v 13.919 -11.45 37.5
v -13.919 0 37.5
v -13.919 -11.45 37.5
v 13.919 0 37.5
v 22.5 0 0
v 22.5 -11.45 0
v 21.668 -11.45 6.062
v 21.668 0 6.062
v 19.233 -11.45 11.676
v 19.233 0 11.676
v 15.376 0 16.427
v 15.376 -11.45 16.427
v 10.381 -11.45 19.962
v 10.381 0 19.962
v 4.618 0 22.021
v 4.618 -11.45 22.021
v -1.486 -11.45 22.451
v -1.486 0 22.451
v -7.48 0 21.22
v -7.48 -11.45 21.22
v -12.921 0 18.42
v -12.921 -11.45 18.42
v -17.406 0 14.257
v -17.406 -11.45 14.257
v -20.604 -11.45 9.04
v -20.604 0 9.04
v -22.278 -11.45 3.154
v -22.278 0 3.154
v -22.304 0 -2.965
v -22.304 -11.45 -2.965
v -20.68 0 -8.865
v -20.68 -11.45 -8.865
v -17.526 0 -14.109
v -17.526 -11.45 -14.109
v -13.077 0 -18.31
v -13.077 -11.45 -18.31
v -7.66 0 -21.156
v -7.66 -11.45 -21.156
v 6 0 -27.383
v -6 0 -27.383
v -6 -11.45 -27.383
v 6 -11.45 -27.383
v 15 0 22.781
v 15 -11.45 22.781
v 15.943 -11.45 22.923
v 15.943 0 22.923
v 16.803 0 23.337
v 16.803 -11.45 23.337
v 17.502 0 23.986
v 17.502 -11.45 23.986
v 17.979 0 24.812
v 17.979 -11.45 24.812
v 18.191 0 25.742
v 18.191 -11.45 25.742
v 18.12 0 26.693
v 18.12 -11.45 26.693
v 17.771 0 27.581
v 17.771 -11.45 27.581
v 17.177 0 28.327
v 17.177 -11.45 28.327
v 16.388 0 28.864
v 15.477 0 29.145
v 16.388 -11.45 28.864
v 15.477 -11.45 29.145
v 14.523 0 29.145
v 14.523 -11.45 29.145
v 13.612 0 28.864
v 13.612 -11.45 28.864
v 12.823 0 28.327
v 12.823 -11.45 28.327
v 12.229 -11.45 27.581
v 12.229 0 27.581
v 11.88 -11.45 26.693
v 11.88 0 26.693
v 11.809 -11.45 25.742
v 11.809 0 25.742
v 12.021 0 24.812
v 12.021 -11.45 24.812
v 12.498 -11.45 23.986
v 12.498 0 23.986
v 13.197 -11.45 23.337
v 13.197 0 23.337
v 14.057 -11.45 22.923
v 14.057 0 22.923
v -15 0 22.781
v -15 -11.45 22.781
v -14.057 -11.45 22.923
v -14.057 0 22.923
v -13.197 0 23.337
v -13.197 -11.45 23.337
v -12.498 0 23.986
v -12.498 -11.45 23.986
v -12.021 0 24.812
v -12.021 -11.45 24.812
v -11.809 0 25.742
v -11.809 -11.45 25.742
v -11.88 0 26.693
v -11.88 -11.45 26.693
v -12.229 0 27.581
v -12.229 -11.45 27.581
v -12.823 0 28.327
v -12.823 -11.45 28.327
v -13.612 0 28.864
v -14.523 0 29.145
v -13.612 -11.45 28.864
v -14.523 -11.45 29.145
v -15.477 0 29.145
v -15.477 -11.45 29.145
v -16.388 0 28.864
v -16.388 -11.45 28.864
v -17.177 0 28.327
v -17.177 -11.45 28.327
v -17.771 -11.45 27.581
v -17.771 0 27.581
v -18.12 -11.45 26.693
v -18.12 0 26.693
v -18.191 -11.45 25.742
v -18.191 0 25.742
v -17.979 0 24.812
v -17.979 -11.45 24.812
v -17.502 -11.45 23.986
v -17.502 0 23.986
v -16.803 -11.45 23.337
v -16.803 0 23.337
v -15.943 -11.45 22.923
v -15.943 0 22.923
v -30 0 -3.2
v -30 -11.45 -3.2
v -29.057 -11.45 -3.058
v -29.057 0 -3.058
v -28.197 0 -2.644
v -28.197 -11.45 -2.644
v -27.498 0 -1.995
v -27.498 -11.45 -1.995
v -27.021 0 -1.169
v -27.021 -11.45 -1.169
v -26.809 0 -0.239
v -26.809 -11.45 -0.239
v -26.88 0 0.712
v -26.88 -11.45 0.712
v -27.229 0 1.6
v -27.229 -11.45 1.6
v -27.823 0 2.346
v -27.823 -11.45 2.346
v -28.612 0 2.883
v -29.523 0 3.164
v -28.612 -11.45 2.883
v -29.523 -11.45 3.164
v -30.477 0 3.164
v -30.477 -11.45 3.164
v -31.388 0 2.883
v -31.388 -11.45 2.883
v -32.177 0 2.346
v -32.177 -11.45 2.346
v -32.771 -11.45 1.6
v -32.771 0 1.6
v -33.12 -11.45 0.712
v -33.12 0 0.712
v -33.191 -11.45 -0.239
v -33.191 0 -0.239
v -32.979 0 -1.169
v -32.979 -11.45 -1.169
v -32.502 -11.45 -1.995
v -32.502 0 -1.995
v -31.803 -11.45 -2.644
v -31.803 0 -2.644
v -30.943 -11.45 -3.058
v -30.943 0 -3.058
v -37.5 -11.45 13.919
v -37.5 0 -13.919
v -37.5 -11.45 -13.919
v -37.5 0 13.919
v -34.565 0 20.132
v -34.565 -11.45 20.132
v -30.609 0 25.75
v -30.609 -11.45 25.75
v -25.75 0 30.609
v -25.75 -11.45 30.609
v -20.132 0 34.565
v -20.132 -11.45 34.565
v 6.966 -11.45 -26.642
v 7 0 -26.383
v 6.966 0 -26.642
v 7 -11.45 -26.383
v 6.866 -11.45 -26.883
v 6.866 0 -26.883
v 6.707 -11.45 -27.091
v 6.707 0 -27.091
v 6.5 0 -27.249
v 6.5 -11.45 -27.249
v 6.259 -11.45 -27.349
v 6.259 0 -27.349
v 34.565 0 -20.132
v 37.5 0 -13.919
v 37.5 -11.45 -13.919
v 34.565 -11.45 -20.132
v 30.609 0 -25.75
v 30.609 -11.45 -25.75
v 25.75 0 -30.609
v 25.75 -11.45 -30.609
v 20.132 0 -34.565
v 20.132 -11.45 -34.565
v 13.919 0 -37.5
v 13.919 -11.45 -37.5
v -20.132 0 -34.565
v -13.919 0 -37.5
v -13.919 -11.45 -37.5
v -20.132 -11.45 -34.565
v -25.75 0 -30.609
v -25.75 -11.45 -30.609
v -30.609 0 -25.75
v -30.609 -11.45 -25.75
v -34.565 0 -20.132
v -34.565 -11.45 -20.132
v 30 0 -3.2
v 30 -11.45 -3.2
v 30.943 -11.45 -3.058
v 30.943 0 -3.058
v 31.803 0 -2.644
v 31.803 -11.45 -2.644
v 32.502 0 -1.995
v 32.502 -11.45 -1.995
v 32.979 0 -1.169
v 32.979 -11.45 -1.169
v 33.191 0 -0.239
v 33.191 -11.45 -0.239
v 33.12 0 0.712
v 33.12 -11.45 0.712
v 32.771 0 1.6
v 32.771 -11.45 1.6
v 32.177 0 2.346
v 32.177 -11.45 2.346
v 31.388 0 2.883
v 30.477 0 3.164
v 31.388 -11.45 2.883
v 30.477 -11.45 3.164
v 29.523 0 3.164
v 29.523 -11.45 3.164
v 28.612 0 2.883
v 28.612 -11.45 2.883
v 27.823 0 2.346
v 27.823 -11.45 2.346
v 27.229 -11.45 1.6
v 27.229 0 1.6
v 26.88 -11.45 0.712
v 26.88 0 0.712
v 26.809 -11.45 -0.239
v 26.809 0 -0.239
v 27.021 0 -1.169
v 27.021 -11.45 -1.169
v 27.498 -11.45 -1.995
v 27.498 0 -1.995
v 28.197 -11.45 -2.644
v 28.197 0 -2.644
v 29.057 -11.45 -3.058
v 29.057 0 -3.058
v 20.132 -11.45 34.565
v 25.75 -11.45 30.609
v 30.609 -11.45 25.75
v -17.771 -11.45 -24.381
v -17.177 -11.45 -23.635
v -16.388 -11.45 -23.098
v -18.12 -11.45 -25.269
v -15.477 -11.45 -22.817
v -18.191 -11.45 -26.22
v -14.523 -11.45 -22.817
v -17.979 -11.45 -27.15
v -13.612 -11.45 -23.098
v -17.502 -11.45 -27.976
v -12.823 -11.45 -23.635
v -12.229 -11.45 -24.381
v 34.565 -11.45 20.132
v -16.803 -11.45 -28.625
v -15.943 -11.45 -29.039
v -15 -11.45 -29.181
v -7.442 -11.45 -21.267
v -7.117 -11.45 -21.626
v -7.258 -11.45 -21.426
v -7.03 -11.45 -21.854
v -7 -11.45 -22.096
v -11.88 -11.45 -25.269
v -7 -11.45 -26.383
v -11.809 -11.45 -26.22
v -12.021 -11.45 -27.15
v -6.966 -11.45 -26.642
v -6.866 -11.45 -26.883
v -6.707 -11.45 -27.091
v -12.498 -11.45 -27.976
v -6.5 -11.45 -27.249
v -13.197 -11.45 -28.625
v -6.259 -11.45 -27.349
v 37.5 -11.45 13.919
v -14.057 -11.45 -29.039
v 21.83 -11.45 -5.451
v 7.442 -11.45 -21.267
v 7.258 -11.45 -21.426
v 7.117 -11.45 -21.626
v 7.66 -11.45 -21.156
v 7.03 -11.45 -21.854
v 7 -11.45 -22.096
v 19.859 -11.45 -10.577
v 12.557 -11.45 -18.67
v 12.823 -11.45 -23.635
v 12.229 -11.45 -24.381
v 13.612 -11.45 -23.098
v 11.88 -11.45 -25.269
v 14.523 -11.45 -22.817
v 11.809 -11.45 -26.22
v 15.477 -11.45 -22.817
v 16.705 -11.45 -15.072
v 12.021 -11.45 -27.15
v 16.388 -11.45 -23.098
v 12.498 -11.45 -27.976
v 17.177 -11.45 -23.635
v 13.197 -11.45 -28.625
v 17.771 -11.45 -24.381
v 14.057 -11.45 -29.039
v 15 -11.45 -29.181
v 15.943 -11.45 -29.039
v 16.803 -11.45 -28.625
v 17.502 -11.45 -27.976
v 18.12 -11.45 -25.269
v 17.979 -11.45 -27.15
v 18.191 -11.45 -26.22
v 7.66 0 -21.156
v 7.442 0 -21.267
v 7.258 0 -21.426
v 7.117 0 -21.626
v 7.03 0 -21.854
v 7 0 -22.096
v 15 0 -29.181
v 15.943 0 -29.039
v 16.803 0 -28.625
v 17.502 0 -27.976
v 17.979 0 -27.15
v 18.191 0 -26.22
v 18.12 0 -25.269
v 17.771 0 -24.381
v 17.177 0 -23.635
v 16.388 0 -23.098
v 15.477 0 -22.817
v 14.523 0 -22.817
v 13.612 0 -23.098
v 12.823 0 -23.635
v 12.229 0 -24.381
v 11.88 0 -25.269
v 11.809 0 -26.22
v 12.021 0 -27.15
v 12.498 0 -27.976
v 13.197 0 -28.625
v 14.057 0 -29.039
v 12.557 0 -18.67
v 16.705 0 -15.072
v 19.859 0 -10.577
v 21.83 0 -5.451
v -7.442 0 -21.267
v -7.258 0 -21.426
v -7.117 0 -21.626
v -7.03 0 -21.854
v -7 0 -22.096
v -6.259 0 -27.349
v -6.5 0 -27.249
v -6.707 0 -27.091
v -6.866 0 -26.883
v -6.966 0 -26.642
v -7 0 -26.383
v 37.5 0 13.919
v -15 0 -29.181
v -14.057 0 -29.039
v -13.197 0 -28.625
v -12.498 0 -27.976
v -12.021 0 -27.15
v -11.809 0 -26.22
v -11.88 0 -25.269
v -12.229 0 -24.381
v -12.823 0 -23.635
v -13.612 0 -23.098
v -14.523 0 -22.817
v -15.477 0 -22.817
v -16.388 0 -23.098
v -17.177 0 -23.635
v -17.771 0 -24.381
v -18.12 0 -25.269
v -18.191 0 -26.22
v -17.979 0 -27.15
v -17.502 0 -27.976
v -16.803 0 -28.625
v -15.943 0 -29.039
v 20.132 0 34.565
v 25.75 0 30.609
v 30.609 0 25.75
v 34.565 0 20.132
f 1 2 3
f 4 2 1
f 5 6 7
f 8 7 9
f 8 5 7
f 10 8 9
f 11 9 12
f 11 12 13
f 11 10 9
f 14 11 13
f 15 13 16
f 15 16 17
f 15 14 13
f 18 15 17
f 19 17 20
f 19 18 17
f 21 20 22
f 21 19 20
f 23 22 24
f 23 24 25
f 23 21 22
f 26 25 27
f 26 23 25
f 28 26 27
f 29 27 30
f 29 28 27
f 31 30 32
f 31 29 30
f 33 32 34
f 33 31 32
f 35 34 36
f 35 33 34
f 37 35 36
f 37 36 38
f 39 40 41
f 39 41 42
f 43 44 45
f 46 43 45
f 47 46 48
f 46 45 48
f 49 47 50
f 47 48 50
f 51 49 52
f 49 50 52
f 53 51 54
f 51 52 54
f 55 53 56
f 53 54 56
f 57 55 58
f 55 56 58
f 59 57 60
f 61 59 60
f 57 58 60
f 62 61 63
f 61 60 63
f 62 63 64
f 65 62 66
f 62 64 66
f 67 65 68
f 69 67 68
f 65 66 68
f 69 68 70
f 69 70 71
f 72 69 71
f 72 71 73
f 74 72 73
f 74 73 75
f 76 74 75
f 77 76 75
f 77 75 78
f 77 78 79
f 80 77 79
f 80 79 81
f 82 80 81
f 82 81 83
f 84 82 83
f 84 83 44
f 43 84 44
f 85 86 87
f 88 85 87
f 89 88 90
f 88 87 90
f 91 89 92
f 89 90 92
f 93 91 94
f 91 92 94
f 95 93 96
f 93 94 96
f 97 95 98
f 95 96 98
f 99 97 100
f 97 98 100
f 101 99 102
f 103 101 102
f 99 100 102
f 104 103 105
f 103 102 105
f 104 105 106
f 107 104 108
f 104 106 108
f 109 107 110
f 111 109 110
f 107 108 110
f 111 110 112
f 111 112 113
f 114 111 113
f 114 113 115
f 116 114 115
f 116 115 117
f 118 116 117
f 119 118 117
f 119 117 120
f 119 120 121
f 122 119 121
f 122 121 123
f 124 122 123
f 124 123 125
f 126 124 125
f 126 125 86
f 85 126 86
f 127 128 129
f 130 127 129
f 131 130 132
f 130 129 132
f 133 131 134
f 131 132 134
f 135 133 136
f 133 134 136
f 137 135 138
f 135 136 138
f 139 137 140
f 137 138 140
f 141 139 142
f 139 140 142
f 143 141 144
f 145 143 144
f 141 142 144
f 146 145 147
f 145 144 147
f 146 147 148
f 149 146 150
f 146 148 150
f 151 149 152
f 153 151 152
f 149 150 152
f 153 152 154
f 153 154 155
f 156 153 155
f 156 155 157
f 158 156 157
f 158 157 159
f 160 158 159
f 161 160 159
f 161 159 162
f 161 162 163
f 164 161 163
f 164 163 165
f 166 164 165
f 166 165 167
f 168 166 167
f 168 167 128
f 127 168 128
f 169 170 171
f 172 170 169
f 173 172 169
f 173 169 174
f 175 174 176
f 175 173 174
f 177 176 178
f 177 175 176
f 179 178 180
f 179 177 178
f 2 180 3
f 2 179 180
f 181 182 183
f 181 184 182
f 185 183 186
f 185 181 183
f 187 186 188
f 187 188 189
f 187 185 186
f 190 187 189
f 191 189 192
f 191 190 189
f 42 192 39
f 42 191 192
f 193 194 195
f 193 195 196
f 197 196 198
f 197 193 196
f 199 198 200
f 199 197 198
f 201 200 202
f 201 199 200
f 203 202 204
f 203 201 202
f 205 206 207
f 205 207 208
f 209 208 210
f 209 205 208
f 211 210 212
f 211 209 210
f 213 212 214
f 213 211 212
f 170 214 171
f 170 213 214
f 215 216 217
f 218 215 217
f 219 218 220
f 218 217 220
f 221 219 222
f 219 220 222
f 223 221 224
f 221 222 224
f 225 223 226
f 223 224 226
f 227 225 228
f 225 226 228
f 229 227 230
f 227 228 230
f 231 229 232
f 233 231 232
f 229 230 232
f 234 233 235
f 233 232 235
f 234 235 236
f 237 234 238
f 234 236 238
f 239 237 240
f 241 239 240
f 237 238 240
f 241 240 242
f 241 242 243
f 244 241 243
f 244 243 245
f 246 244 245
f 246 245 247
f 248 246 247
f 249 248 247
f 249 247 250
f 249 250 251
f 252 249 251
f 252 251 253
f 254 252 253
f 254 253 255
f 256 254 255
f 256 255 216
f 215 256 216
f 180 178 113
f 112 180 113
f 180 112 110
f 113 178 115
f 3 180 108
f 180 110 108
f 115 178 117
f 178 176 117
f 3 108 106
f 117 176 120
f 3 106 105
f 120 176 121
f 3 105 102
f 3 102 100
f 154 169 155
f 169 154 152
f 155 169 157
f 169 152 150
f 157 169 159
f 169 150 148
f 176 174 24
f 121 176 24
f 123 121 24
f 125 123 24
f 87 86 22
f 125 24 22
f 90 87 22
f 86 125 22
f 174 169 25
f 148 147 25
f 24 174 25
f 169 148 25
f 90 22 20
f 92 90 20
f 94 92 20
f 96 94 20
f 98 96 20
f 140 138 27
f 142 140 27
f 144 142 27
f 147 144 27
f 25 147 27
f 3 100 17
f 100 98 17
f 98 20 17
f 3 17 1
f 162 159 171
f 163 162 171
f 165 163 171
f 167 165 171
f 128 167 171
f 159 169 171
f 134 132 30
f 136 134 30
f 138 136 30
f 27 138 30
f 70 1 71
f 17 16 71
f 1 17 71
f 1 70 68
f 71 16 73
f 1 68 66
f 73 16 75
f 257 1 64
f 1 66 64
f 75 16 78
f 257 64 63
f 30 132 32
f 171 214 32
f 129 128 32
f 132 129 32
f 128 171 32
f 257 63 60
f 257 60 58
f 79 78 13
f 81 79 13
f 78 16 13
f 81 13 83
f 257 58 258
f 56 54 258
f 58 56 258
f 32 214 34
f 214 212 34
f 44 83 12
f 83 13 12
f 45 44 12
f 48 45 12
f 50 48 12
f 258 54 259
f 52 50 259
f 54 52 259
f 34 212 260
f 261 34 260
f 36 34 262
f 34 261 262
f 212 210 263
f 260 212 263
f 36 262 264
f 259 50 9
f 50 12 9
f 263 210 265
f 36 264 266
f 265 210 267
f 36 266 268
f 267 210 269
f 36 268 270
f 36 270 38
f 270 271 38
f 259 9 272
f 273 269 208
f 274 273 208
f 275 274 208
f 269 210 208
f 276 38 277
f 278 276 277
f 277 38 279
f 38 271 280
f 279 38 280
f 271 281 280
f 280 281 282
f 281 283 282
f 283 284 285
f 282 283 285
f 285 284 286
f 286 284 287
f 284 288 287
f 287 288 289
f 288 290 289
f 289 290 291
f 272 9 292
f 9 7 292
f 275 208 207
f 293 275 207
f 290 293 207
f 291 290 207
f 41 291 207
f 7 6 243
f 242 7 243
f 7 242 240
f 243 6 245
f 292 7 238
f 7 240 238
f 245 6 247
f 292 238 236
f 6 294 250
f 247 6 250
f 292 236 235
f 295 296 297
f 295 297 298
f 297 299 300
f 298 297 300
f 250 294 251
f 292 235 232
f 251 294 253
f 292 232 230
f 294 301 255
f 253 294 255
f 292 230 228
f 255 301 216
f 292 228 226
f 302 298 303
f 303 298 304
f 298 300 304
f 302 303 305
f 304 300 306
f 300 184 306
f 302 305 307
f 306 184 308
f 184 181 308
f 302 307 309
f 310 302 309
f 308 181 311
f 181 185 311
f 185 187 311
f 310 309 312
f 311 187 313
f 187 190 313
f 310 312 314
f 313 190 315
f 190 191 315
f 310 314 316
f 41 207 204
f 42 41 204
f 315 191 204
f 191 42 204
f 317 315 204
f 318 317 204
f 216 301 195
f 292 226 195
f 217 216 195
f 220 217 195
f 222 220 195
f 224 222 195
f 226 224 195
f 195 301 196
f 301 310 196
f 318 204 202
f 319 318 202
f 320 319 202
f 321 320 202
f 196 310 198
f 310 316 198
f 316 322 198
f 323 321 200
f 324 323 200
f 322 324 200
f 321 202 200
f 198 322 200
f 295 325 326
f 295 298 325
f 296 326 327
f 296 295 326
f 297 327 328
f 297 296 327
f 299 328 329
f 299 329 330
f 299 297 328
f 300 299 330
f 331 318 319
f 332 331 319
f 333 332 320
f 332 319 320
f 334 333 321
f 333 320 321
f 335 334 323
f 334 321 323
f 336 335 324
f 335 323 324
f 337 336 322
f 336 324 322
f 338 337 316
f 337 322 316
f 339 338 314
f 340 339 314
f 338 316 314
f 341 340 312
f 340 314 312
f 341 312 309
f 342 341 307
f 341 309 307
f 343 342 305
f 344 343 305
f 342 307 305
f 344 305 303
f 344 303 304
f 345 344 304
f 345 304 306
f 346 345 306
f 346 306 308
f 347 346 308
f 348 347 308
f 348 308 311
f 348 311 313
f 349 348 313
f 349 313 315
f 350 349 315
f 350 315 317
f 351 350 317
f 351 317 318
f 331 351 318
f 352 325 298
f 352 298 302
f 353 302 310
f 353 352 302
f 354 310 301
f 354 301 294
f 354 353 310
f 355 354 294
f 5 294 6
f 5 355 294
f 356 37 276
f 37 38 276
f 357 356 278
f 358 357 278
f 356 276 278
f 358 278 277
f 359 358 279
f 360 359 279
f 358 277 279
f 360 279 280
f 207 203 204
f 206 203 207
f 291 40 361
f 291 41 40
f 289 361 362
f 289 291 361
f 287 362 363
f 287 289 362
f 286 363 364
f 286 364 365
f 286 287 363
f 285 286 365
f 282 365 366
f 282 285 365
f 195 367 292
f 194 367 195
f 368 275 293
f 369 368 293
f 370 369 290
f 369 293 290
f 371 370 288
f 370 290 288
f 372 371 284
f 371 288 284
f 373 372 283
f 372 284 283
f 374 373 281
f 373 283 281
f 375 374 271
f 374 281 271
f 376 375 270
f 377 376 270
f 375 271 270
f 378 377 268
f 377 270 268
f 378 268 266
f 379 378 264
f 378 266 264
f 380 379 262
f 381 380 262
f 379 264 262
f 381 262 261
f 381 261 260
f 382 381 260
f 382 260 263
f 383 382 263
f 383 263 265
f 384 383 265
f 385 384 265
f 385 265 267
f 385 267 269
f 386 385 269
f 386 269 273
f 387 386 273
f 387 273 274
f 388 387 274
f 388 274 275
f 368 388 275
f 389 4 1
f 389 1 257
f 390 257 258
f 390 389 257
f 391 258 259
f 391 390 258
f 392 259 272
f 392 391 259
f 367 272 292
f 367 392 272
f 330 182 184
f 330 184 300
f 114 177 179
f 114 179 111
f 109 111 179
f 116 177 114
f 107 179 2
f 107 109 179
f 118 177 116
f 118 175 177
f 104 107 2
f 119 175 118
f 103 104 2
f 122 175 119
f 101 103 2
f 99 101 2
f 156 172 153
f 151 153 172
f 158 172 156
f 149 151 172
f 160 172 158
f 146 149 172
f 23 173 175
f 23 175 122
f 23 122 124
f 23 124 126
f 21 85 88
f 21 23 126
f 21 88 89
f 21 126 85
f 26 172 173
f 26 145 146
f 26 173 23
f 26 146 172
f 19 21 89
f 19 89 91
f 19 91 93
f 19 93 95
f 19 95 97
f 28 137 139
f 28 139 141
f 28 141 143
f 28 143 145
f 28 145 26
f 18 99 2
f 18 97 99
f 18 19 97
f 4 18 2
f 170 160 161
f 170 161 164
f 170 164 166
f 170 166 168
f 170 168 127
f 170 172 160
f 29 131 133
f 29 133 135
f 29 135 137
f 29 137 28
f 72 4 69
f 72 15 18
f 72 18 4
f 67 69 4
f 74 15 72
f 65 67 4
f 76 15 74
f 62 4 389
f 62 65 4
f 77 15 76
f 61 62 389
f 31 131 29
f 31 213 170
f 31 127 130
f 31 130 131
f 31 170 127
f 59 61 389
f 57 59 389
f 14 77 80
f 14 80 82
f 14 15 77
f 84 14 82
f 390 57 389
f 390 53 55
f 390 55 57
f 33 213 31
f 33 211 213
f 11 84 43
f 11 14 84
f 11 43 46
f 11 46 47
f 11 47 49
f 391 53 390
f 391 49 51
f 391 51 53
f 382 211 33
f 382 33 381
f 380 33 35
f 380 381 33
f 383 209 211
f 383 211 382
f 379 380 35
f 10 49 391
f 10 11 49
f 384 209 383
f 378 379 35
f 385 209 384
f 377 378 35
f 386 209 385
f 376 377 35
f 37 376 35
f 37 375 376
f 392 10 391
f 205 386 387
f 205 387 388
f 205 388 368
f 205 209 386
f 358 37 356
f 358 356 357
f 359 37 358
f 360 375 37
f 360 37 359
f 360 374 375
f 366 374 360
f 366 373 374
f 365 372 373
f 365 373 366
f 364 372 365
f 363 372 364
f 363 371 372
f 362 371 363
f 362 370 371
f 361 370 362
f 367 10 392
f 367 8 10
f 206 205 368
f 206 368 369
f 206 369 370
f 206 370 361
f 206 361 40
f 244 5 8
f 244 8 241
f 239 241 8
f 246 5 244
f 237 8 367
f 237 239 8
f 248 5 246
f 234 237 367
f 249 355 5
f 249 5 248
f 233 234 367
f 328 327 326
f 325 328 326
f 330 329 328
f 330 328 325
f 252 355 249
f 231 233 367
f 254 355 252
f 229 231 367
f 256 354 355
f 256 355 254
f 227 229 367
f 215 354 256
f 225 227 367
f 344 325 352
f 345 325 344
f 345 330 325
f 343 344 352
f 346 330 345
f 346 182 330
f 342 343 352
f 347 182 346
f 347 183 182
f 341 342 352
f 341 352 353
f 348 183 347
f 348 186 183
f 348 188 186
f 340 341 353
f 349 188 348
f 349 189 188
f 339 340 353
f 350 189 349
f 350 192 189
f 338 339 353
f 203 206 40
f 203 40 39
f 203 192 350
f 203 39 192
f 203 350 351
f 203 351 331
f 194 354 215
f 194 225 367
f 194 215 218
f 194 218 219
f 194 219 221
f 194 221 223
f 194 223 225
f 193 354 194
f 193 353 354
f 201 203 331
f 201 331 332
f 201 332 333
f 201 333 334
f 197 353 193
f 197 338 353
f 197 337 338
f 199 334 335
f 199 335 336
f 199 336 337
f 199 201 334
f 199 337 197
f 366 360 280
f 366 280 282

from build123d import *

# Parameters (mm, degrees)
BOSS_EXTRUDE1_DEPTH  = 11.45
M6_CLEARANCE_HOLE1_D = 6.4
FILLET1_R            = 1


with BuildPart() as part:
    # Sketch1 → Boss-Extrude1 (new body)
    with BuildSketch(Plane(origin=(0, 0, 0), x_dir=(1, 0, 0), z_dir=(0, 1, 0))):
        with BuildLine():
            Line((13.919410907, 37.5), (-13.919410907, 37.5))
            ThreePointArc((-13.919410907, 37.5), (-28.284271247, 28.284271247), (-37.5, 13.919410907))
            Line((-37.5, 13.919410907), (-37.5, -13.919410907))
            ThreePointArc((-37.5, -13.919410907), (-28.284271247, -28.284271247), (-13.919410907, -37.5))
            Line((-13.919410907, -37.5), (13.919410907, -37.5))
            ThreePointArc((13.919410907, -37.5), (28.284271247, -28.284271247), (37.5, -13.919410907))
            Line((37.5, -13.919410907), (37.5, 13.919410907))
            ThreePointArc((37.5, 13.919410907), (28.284271247, 28.284271247), (13.919410907, 37.5))
        make_face()
        with BuildLine():
            ThreePointArc((22.5, 0), (-13.205112646, -18.217436702), (-7, 21.38340478))
            Line((-7, 21.38340478), (-7, 27.38340478))
            Line((-7, 27.38340478), (7, 27.38340478))
            Line((7, 27.38340478), (7, 21.38340478))
            ThreePointArc((7, 21.38340478), (18.217436702, 13.205112646), (22.5, 0))
        make_face(mode=Mode.SUBTRACT)
    extrude(amount=-BOSS_EXTRUDE1_DEPTH)

    # M6 Clearance Hole1 (through all)
    with Locations(Plane(origin=(-30, 0, 0), x_dir=(0, 0, 1), z_dir=(0, 1, 0))):
        with Locations((0, 0), (-25.980762114, 15), (-25.980762114, 45), (0, 60), (25.980762114, 45), (25.980762114, 15)):
            Hole(M6_CLEARANCE_HOLE1_D / 2)

    # Fillet1
    fillet1_edges = [part.edges().sort_by_distance(p)[0] for p in [
        (7, -5.725, -21.38340478),
        (7, -5.725, -27.38340478),
        (-7, -5.725, -27.38340478),
        (-7, -5.725, -21.38340478),
    ]]
    fillet(fillet1_edges, radius=FILLET1_R)


solid = part.part
